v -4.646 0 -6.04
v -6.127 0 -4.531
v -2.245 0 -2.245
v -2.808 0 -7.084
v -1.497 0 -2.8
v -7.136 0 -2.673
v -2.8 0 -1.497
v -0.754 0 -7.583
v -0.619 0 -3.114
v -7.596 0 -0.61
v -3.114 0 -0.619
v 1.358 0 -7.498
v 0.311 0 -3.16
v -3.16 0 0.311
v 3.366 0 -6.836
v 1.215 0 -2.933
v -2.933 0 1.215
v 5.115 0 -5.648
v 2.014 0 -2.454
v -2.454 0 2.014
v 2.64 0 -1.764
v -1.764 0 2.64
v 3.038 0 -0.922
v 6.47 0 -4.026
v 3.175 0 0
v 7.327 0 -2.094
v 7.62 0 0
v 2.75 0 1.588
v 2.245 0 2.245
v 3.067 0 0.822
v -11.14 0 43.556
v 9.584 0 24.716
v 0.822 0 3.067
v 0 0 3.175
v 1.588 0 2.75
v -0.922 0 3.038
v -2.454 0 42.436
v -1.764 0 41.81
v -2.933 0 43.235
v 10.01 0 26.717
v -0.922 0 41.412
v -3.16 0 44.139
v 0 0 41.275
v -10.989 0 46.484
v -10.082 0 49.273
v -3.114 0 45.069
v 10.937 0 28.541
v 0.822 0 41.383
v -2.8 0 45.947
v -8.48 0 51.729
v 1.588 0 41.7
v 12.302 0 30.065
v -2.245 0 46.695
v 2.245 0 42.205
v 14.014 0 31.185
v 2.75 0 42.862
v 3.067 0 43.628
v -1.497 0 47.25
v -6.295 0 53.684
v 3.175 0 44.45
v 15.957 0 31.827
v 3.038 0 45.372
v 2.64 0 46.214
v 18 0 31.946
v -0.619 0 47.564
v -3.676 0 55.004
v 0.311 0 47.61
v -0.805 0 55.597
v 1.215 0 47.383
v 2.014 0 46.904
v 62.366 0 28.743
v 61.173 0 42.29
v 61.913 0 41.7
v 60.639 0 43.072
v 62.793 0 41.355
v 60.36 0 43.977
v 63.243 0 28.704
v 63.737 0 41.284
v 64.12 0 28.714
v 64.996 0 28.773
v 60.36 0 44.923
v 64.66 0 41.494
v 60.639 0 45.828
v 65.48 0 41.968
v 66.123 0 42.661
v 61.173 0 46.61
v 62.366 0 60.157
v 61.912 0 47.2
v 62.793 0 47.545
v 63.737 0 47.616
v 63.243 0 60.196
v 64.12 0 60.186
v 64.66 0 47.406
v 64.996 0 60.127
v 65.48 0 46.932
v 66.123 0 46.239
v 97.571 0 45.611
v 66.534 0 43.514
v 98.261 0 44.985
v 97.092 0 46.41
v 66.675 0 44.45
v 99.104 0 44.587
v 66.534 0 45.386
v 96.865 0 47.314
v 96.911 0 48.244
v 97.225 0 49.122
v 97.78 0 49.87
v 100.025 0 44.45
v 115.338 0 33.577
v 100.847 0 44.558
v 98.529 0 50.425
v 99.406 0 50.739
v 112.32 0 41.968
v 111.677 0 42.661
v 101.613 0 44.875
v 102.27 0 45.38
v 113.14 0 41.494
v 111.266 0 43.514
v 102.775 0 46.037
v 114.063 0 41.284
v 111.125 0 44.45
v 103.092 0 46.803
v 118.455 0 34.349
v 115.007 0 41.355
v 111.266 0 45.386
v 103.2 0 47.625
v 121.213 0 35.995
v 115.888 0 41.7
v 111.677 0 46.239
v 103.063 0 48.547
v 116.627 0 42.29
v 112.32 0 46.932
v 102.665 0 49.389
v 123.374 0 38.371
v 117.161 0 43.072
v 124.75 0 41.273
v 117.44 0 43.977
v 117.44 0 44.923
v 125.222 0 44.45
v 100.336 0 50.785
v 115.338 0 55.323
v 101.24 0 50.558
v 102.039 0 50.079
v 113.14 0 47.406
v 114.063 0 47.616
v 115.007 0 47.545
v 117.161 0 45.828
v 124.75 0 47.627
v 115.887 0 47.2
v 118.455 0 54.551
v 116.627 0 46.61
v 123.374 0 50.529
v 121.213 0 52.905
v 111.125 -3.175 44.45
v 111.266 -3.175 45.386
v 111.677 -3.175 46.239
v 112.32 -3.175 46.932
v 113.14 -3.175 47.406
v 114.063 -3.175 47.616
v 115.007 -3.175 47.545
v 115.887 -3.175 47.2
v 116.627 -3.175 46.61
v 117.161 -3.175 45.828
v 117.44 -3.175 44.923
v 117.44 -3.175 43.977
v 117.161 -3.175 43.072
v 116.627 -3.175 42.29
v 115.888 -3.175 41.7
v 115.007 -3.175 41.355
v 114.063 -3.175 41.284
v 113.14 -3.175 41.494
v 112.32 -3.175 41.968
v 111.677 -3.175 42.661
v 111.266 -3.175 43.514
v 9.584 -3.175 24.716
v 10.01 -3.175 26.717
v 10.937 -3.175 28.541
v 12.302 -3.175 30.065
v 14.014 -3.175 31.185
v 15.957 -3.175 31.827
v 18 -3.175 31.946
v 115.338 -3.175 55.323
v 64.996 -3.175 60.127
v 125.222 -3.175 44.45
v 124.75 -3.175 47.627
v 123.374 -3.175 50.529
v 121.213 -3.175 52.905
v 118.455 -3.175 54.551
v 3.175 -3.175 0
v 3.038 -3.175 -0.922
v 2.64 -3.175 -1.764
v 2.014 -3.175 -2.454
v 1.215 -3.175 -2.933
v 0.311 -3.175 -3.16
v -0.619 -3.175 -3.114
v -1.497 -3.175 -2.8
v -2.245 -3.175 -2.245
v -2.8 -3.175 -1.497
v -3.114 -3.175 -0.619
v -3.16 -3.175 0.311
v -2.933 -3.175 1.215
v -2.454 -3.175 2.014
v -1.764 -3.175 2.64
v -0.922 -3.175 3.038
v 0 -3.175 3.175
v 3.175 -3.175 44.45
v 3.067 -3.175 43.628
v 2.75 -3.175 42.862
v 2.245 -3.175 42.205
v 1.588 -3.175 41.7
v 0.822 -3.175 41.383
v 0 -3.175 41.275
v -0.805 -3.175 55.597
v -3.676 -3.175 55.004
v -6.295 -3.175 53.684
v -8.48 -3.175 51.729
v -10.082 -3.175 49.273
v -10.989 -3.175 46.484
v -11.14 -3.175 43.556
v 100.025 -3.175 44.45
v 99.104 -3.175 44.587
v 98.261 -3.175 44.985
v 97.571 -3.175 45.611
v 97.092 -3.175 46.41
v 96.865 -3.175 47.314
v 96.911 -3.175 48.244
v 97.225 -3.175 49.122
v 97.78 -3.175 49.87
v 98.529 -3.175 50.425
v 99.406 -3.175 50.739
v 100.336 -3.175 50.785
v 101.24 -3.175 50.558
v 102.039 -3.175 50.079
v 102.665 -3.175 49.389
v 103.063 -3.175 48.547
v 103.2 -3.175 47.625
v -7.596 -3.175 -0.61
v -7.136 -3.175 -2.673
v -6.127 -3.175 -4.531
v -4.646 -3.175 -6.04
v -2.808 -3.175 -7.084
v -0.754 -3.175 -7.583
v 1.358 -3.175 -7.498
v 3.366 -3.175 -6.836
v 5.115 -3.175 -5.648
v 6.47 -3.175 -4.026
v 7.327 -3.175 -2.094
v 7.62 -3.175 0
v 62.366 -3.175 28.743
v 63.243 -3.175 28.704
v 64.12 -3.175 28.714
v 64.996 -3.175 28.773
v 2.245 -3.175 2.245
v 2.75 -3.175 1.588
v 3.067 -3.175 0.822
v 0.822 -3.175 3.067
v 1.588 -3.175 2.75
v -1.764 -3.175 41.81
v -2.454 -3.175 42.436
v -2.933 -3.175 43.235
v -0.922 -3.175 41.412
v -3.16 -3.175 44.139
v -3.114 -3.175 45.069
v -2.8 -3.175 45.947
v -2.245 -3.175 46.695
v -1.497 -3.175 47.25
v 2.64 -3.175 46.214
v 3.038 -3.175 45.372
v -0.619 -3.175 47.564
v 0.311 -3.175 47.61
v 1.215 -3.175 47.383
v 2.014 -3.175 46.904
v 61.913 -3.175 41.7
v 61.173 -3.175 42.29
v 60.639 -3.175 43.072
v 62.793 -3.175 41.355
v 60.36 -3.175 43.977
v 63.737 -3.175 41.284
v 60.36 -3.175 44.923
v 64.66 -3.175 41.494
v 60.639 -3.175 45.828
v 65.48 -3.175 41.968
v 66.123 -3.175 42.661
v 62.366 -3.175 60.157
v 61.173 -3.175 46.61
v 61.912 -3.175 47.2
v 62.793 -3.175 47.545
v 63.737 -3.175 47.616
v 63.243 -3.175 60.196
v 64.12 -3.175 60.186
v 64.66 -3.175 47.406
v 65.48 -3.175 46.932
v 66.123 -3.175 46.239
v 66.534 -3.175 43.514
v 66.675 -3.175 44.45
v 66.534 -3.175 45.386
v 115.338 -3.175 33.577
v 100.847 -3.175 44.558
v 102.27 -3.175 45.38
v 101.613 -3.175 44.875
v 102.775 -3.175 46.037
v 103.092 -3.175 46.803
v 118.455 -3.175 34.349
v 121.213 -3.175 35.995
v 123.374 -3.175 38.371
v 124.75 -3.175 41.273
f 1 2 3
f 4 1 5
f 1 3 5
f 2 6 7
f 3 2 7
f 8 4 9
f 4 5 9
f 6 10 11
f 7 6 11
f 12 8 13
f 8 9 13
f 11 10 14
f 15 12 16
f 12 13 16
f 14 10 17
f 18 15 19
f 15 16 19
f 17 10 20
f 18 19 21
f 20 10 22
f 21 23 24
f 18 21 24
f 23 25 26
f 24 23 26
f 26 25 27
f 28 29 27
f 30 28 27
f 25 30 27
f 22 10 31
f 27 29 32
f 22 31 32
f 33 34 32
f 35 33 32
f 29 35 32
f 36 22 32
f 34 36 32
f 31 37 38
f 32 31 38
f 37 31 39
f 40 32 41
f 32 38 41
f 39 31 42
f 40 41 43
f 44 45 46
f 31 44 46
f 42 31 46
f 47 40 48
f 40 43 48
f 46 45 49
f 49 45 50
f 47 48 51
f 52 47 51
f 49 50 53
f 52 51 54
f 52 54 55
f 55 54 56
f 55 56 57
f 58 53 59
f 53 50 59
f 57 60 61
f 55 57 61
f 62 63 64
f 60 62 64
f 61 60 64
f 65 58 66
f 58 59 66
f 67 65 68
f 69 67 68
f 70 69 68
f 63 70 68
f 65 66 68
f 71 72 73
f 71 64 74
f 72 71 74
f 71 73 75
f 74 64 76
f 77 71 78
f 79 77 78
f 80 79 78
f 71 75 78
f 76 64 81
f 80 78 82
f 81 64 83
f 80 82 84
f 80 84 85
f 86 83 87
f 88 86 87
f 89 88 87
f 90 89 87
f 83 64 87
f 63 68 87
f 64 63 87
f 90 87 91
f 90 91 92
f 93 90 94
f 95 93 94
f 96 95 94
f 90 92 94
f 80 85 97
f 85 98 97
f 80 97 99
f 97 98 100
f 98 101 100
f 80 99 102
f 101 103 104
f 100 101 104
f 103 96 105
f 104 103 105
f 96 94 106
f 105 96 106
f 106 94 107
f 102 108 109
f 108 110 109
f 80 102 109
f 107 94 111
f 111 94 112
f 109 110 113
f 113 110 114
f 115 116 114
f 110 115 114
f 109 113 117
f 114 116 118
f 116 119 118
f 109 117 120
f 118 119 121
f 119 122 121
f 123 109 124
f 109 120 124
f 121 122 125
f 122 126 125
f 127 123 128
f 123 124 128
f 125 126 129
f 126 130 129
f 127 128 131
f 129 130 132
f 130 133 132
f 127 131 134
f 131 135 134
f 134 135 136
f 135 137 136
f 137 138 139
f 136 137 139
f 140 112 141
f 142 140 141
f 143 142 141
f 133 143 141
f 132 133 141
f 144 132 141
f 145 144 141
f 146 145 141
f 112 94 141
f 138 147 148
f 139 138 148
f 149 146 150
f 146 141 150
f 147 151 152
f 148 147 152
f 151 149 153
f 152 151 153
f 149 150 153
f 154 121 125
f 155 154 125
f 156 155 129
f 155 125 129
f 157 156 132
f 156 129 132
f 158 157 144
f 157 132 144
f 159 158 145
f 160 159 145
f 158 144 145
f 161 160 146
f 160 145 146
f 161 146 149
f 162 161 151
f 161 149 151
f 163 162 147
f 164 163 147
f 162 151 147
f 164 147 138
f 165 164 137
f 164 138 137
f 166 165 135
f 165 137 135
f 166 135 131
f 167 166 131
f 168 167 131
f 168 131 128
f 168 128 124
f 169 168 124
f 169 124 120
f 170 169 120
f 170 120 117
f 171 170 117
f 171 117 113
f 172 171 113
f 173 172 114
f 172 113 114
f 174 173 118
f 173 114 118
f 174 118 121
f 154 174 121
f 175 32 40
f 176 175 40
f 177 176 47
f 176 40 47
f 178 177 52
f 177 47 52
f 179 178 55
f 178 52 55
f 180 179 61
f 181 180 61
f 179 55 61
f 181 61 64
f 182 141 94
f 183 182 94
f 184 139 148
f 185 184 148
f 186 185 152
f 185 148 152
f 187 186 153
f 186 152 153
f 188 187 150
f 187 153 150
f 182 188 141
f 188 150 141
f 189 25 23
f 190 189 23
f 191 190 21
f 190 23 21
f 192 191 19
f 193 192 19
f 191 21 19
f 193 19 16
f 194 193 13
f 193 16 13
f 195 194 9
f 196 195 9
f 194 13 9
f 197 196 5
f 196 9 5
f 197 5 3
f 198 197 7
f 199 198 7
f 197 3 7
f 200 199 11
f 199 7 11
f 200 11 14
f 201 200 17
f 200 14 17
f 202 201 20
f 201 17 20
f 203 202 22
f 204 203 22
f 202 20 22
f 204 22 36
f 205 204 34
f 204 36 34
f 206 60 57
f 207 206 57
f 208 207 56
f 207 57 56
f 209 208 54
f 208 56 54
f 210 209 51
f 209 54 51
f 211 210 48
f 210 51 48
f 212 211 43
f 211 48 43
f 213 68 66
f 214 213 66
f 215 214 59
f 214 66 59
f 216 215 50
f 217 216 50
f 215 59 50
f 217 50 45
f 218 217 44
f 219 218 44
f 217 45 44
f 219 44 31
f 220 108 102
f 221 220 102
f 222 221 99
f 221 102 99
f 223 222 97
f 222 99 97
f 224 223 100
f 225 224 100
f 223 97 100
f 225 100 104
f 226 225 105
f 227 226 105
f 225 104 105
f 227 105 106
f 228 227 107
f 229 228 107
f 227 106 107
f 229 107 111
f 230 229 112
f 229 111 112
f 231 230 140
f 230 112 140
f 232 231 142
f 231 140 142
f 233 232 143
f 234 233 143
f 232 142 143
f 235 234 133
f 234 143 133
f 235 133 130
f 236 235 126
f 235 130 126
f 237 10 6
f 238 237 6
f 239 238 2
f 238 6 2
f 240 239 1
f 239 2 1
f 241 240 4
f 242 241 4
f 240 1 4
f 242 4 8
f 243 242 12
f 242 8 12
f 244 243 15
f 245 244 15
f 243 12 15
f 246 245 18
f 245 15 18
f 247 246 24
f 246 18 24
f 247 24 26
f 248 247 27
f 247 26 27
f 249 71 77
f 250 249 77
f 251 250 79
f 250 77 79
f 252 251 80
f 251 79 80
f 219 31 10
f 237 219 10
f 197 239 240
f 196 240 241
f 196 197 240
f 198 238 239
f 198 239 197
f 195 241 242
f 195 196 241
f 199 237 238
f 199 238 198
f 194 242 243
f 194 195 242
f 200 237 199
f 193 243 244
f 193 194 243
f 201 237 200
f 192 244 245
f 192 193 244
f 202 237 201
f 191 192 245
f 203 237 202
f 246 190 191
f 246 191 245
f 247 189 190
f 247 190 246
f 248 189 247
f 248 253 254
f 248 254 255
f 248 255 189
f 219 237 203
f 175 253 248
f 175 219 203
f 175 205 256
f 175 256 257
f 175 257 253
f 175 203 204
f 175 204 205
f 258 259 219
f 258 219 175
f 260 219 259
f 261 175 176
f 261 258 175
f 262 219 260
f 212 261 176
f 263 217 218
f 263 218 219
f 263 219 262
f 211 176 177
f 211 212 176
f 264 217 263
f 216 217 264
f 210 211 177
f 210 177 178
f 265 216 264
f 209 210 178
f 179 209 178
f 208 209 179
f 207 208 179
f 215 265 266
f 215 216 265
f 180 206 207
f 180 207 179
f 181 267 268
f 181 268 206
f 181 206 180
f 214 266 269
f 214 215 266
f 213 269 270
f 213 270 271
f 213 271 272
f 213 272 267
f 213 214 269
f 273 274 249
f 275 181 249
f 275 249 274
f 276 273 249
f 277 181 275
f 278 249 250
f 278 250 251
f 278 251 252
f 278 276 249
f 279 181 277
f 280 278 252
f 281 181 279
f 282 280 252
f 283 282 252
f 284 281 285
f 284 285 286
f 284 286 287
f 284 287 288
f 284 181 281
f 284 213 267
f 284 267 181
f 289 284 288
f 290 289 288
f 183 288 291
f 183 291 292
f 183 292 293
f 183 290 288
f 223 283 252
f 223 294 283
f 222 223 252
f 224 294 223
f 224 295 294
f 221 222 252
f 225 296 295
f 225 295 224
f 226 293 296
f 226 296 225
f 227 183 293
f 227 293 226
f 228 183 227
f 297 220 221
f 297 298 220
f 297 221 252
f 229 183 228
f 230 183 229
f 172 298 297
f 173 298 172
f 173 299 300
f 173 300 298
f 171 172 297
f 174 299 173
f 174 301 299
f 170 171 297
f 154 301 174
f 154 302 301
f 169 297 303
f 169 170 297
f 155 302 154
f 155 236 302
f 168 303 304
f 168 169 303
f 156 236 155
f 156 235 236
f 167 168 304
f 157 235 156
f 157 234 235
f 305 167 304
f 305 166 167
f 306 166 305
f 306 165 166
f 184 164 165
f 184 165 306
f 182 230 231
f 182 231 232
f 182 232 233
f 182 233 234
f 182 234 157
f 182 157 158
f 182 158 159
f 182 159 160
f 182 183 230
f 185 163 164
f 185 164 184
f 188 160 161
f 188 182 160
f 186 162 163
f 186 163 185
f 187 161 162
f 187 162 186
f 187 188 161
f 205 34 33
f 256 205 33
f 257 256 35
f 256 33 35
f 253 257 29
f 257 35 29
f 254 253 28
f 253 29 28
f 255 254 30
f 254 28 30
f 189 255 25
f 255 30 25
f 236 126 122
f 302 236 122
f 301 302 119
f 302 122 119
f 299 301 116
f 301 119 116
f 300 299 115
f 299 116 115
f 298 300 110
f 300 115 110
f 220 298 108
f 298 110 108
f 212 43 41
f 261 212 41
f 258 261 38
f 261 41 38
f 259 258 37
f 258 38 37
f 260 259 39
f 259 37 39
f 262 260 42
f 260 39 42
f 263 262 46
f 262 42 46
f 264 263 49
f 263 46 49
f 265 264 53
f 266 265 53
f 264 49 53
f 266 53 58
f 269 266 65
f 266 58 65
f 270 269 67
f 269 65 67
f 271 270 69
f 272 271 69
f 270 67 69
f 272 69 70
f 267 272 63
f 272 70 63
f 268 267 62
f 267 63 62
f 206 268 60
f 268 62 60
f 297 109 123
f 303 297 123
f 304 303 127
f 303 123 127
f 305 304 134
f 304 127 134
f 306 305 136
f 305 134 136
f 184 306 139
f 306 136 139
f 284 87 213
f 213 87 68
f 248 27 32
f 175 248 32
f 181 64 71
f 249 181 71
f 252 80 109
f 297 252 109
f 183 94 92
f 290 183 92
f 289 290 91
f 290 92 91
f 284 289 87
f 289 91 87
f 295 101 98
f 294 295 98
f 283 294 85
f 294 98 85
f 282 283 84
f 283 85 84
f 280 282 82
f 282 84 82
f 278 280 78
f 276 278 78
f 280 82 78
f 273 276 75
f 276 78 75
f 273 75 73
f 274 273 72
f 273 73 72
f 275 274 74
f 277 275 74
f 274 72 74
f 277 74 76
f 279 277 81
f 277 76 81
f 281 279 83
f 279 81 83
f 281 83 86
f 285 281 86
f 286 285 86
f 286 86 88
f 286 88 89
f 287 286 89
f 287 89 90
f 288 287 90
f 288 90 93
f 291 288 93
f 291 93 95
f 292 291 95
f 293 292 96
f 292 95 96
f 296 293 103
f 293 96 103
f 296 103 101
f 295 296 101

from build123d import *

# Parameters (mm, degrees)
F1_DEPTH = 3.175


with BuildPart() as f1:
    # F0 (on Front) → F1 (new body)
    with BuildSketch(Plane.XZ):
        with BuildLine():
            ThreePointArc((0, 7.62), (-5.599533552, 5.1681354471), (-7.5955768603, -0.6096))
            ThreePointArc((-7.5955768603, -0.6096), (0.3050445253, -7.6138917669), (7.62, 0))
            ThreePointArc((7.62, 0), (5.3881536726, 5.3881536726), (0, 7.62))
        make_face()
        with BuildLine():
            ThreePointArc((3.175, 0), (-2.2450640303, -2.2450640303), (0, 3.175))
            ThreePointArc((0, 3.175), (2.2450640303, 2.2450640303), (3.175, 0))
        make_face(mode=Mode.SUBTRACT)
        with BuildLine():
            Line((-11.140179395, 43.55592), (-7.5955768603, -0.6096))
            ThreePointArc((-7.5955768603, -0.6096), (-5.599533552, 5.1681354471), (0, 7.62))
            Line((0, 7.62), (0, 33.274))
            ThreePointArc((0, 33.274), (-7.5799319891, 36.2373507904), (-11.140179395, 43.55592))
        make_face()
        with BuildLine():
            Line((62.366144, 60.1571281452), (-0.804672, 55.5969941676))
            ThreePointArc((-0.804672, 55.5969941676), (7.612816881, 52.6321754525), (11.176, 44.45))
            Line((11.176, 44.45), (47.752, 44.45))
            ThreePointArc((47.752, 44.45), (51.9705709533, 55.1771510596), (62.366144, 60.1571281452))
        make_face()
        with BuildLine():
            ThreePointArc((79.248, 44.45), (75.1524558974, 33.8566164253), (64.99606, 28.7732239132))
            Line((64.99606, 28.7732239132), (115.33759, 33.5773972301))
            ThreePointArc((115.33759, 33.5773972301), (106.9529759079, 36.3684580067), (103.378, 44.45))
            Line((103.378, 44.45), (100.0252, 44.45))
            Line((100.0252, 44.45), (79.248, 44.45))
        make_face()
        with BuildLine():
            ThreePointArc((125.222, 44.45), (122.3815419933, 51.7970240921), (115.33759, 55.3226027699))
            ThreePointArc((115.33759, 55.3226027699), (106.9529759079, 52.5315419933), (103.378, 44.45))
            ThreePointArc((103.378, 44.45), (106.9529759079, 36.3684580067), (115.33759, 33.5773972301))
            ThreePointArc((115.33759, 33.5773972301), (122.3815419933, 37.1029759079), (125.222, 44.45))
        make_face()
        with BuildLine():
            ThreePointArc((117.475, 44.45), (114.3, 41.275), (111.125, 44.45))
            ThreePointArc((111.125, 44.45), (114.3, 47.625), (117.475, 44.45))
        make_face(mode=Mode.SUBTRACT)
        with BuildLine():
            ThreePointArc((-0.804672, 55.5969941676), (-8.4803735466, 51.7291648223), (-11.140179395, 43.55592))
            ThreePointArc((-11.140179395, 43.55592), (-7.5799319891, 36.2373507904), (0, 33.274))
            Line((0, 33.274), (0, 41.275))
            ThreePointArc((0, 41.275), (-2.2450640303, 46.6950640303), (3.175, 44.45))
            Line((3.175, 44.45), (11.176, 44.45))
            ThreePointArc((11.176, 44.45), (7.612816881, 52.6321754525), (-0.804672, 55.5969941676))
        make_face()
        with BuildLine():
            ThreePointArc((64.99606, 60.1267760868), (63.6817367499, 60.1969513162), (62.366144, 60.1571281452))
            ThreePointArc((62.366144, 60.1571281452), (51.9705709533, 55.1771510596), (47.752, 44.45))
            Line((47.752, 44.45), (60.325, 44.45))
            ThreePointArc((60.325, 44.45), (63.5, 47.625), (66.675, 44.45))
            Line((66.675, 44.45), (79.248, 44.45))
            ThreePointArc((79.248, 44.45), (75.1524558974, 55.0433835747), (64.99606, 60.1267760868))
        make_face()
        with BuildLine():
            ThreePointArc((47.752, 44.45), (51.970558664, 33.7228621488), (62.3661080111, 28.7428744527))
            ThreePointArc((62.3661080111, 28.7428744527), (63.6817187098, 28.7030484756), (64.99606, 28.7732239132))
            ThreePointArc((64.99606, 28.7732239132), (75.1524558974, 33.8566164253), (79.248, 44.45))
            Line((79.248, 44.45), (66.675, 44.45))
            ThreePointArc((66.675, 44.45), (63.5, 41.275), (60.325, 44.45))
            Line((60.325, 44.45), (47.752, 44.45))
        make_face()
        with BuildLine():
            Line((115.33759, 55.3226027699), (64.99606, 60.1267760868))
            ThreePointArc((64.99606, 60.1267760868), (75.1524558974, 55.0433835747), (79.248, 44.45))
            Line((79.248, 44.45), (100.0252, 44.45))
            Line((100.0252, 44.45), (103.378, 44.45))
            ThreePointArc((103.378, 44.45), (106.9529759079, 52.5315419933), (115.33759, 55.3226027699))
        make_face()
        with BuildLine():
            ThreePointArc((103.2002, 47.625), (102.2702640303, 45.3799359697), (100.0252, 44.45))
            ThreePointArc((100.0252, 44.45), (97.7801359697, 49.8700640303), (103.2002, 47.625))
        make_face(mode=Mode.SUBTRACT)
        with BuildLine():
            Line((0, 41.275), (0, 33.274))
            ThreePointArc((0, 33.274), (7.9026253865, 36.5473746135), (11.176, 44.45))
            Line((11.176, 44.45), (3.175, 44.45))
            ThreePointArc((3.175, 44.45), (2.2450640303, 42.2049359697), (0, 41.275))
        make_face()
        with BuildLine():
            ThreePointArc((0, 7.62), (5.3881536726, 5.3881536726), (7.62, 0))
            Line((7.62, 0), (9.5838374982, 24.7157604221))
            ThreePointArc((9.5838374982, 24.7157604221), (12.3022276898, 30.0648572861), (18.000044724, 31.9456452964))
            Line((18.000044724, 31.9456452964), (62.3661080111, 28.7428744527))
            ThreePointArc((62.3661080111, 28.7428744527), (51.970558664, 33.7228621488), (47.752, 44.45))
            Line((47.752, 44.45), (11.176, 44.45))
            ThreePointArc((11.176, 44.45), (7.9026253865, 36.5473746135), (0, 33.274))
            Line((0, 33.274), (0, 7.62))
        make_face()
    extrude(amount=F1_DEPTH)


solid = f1.part
